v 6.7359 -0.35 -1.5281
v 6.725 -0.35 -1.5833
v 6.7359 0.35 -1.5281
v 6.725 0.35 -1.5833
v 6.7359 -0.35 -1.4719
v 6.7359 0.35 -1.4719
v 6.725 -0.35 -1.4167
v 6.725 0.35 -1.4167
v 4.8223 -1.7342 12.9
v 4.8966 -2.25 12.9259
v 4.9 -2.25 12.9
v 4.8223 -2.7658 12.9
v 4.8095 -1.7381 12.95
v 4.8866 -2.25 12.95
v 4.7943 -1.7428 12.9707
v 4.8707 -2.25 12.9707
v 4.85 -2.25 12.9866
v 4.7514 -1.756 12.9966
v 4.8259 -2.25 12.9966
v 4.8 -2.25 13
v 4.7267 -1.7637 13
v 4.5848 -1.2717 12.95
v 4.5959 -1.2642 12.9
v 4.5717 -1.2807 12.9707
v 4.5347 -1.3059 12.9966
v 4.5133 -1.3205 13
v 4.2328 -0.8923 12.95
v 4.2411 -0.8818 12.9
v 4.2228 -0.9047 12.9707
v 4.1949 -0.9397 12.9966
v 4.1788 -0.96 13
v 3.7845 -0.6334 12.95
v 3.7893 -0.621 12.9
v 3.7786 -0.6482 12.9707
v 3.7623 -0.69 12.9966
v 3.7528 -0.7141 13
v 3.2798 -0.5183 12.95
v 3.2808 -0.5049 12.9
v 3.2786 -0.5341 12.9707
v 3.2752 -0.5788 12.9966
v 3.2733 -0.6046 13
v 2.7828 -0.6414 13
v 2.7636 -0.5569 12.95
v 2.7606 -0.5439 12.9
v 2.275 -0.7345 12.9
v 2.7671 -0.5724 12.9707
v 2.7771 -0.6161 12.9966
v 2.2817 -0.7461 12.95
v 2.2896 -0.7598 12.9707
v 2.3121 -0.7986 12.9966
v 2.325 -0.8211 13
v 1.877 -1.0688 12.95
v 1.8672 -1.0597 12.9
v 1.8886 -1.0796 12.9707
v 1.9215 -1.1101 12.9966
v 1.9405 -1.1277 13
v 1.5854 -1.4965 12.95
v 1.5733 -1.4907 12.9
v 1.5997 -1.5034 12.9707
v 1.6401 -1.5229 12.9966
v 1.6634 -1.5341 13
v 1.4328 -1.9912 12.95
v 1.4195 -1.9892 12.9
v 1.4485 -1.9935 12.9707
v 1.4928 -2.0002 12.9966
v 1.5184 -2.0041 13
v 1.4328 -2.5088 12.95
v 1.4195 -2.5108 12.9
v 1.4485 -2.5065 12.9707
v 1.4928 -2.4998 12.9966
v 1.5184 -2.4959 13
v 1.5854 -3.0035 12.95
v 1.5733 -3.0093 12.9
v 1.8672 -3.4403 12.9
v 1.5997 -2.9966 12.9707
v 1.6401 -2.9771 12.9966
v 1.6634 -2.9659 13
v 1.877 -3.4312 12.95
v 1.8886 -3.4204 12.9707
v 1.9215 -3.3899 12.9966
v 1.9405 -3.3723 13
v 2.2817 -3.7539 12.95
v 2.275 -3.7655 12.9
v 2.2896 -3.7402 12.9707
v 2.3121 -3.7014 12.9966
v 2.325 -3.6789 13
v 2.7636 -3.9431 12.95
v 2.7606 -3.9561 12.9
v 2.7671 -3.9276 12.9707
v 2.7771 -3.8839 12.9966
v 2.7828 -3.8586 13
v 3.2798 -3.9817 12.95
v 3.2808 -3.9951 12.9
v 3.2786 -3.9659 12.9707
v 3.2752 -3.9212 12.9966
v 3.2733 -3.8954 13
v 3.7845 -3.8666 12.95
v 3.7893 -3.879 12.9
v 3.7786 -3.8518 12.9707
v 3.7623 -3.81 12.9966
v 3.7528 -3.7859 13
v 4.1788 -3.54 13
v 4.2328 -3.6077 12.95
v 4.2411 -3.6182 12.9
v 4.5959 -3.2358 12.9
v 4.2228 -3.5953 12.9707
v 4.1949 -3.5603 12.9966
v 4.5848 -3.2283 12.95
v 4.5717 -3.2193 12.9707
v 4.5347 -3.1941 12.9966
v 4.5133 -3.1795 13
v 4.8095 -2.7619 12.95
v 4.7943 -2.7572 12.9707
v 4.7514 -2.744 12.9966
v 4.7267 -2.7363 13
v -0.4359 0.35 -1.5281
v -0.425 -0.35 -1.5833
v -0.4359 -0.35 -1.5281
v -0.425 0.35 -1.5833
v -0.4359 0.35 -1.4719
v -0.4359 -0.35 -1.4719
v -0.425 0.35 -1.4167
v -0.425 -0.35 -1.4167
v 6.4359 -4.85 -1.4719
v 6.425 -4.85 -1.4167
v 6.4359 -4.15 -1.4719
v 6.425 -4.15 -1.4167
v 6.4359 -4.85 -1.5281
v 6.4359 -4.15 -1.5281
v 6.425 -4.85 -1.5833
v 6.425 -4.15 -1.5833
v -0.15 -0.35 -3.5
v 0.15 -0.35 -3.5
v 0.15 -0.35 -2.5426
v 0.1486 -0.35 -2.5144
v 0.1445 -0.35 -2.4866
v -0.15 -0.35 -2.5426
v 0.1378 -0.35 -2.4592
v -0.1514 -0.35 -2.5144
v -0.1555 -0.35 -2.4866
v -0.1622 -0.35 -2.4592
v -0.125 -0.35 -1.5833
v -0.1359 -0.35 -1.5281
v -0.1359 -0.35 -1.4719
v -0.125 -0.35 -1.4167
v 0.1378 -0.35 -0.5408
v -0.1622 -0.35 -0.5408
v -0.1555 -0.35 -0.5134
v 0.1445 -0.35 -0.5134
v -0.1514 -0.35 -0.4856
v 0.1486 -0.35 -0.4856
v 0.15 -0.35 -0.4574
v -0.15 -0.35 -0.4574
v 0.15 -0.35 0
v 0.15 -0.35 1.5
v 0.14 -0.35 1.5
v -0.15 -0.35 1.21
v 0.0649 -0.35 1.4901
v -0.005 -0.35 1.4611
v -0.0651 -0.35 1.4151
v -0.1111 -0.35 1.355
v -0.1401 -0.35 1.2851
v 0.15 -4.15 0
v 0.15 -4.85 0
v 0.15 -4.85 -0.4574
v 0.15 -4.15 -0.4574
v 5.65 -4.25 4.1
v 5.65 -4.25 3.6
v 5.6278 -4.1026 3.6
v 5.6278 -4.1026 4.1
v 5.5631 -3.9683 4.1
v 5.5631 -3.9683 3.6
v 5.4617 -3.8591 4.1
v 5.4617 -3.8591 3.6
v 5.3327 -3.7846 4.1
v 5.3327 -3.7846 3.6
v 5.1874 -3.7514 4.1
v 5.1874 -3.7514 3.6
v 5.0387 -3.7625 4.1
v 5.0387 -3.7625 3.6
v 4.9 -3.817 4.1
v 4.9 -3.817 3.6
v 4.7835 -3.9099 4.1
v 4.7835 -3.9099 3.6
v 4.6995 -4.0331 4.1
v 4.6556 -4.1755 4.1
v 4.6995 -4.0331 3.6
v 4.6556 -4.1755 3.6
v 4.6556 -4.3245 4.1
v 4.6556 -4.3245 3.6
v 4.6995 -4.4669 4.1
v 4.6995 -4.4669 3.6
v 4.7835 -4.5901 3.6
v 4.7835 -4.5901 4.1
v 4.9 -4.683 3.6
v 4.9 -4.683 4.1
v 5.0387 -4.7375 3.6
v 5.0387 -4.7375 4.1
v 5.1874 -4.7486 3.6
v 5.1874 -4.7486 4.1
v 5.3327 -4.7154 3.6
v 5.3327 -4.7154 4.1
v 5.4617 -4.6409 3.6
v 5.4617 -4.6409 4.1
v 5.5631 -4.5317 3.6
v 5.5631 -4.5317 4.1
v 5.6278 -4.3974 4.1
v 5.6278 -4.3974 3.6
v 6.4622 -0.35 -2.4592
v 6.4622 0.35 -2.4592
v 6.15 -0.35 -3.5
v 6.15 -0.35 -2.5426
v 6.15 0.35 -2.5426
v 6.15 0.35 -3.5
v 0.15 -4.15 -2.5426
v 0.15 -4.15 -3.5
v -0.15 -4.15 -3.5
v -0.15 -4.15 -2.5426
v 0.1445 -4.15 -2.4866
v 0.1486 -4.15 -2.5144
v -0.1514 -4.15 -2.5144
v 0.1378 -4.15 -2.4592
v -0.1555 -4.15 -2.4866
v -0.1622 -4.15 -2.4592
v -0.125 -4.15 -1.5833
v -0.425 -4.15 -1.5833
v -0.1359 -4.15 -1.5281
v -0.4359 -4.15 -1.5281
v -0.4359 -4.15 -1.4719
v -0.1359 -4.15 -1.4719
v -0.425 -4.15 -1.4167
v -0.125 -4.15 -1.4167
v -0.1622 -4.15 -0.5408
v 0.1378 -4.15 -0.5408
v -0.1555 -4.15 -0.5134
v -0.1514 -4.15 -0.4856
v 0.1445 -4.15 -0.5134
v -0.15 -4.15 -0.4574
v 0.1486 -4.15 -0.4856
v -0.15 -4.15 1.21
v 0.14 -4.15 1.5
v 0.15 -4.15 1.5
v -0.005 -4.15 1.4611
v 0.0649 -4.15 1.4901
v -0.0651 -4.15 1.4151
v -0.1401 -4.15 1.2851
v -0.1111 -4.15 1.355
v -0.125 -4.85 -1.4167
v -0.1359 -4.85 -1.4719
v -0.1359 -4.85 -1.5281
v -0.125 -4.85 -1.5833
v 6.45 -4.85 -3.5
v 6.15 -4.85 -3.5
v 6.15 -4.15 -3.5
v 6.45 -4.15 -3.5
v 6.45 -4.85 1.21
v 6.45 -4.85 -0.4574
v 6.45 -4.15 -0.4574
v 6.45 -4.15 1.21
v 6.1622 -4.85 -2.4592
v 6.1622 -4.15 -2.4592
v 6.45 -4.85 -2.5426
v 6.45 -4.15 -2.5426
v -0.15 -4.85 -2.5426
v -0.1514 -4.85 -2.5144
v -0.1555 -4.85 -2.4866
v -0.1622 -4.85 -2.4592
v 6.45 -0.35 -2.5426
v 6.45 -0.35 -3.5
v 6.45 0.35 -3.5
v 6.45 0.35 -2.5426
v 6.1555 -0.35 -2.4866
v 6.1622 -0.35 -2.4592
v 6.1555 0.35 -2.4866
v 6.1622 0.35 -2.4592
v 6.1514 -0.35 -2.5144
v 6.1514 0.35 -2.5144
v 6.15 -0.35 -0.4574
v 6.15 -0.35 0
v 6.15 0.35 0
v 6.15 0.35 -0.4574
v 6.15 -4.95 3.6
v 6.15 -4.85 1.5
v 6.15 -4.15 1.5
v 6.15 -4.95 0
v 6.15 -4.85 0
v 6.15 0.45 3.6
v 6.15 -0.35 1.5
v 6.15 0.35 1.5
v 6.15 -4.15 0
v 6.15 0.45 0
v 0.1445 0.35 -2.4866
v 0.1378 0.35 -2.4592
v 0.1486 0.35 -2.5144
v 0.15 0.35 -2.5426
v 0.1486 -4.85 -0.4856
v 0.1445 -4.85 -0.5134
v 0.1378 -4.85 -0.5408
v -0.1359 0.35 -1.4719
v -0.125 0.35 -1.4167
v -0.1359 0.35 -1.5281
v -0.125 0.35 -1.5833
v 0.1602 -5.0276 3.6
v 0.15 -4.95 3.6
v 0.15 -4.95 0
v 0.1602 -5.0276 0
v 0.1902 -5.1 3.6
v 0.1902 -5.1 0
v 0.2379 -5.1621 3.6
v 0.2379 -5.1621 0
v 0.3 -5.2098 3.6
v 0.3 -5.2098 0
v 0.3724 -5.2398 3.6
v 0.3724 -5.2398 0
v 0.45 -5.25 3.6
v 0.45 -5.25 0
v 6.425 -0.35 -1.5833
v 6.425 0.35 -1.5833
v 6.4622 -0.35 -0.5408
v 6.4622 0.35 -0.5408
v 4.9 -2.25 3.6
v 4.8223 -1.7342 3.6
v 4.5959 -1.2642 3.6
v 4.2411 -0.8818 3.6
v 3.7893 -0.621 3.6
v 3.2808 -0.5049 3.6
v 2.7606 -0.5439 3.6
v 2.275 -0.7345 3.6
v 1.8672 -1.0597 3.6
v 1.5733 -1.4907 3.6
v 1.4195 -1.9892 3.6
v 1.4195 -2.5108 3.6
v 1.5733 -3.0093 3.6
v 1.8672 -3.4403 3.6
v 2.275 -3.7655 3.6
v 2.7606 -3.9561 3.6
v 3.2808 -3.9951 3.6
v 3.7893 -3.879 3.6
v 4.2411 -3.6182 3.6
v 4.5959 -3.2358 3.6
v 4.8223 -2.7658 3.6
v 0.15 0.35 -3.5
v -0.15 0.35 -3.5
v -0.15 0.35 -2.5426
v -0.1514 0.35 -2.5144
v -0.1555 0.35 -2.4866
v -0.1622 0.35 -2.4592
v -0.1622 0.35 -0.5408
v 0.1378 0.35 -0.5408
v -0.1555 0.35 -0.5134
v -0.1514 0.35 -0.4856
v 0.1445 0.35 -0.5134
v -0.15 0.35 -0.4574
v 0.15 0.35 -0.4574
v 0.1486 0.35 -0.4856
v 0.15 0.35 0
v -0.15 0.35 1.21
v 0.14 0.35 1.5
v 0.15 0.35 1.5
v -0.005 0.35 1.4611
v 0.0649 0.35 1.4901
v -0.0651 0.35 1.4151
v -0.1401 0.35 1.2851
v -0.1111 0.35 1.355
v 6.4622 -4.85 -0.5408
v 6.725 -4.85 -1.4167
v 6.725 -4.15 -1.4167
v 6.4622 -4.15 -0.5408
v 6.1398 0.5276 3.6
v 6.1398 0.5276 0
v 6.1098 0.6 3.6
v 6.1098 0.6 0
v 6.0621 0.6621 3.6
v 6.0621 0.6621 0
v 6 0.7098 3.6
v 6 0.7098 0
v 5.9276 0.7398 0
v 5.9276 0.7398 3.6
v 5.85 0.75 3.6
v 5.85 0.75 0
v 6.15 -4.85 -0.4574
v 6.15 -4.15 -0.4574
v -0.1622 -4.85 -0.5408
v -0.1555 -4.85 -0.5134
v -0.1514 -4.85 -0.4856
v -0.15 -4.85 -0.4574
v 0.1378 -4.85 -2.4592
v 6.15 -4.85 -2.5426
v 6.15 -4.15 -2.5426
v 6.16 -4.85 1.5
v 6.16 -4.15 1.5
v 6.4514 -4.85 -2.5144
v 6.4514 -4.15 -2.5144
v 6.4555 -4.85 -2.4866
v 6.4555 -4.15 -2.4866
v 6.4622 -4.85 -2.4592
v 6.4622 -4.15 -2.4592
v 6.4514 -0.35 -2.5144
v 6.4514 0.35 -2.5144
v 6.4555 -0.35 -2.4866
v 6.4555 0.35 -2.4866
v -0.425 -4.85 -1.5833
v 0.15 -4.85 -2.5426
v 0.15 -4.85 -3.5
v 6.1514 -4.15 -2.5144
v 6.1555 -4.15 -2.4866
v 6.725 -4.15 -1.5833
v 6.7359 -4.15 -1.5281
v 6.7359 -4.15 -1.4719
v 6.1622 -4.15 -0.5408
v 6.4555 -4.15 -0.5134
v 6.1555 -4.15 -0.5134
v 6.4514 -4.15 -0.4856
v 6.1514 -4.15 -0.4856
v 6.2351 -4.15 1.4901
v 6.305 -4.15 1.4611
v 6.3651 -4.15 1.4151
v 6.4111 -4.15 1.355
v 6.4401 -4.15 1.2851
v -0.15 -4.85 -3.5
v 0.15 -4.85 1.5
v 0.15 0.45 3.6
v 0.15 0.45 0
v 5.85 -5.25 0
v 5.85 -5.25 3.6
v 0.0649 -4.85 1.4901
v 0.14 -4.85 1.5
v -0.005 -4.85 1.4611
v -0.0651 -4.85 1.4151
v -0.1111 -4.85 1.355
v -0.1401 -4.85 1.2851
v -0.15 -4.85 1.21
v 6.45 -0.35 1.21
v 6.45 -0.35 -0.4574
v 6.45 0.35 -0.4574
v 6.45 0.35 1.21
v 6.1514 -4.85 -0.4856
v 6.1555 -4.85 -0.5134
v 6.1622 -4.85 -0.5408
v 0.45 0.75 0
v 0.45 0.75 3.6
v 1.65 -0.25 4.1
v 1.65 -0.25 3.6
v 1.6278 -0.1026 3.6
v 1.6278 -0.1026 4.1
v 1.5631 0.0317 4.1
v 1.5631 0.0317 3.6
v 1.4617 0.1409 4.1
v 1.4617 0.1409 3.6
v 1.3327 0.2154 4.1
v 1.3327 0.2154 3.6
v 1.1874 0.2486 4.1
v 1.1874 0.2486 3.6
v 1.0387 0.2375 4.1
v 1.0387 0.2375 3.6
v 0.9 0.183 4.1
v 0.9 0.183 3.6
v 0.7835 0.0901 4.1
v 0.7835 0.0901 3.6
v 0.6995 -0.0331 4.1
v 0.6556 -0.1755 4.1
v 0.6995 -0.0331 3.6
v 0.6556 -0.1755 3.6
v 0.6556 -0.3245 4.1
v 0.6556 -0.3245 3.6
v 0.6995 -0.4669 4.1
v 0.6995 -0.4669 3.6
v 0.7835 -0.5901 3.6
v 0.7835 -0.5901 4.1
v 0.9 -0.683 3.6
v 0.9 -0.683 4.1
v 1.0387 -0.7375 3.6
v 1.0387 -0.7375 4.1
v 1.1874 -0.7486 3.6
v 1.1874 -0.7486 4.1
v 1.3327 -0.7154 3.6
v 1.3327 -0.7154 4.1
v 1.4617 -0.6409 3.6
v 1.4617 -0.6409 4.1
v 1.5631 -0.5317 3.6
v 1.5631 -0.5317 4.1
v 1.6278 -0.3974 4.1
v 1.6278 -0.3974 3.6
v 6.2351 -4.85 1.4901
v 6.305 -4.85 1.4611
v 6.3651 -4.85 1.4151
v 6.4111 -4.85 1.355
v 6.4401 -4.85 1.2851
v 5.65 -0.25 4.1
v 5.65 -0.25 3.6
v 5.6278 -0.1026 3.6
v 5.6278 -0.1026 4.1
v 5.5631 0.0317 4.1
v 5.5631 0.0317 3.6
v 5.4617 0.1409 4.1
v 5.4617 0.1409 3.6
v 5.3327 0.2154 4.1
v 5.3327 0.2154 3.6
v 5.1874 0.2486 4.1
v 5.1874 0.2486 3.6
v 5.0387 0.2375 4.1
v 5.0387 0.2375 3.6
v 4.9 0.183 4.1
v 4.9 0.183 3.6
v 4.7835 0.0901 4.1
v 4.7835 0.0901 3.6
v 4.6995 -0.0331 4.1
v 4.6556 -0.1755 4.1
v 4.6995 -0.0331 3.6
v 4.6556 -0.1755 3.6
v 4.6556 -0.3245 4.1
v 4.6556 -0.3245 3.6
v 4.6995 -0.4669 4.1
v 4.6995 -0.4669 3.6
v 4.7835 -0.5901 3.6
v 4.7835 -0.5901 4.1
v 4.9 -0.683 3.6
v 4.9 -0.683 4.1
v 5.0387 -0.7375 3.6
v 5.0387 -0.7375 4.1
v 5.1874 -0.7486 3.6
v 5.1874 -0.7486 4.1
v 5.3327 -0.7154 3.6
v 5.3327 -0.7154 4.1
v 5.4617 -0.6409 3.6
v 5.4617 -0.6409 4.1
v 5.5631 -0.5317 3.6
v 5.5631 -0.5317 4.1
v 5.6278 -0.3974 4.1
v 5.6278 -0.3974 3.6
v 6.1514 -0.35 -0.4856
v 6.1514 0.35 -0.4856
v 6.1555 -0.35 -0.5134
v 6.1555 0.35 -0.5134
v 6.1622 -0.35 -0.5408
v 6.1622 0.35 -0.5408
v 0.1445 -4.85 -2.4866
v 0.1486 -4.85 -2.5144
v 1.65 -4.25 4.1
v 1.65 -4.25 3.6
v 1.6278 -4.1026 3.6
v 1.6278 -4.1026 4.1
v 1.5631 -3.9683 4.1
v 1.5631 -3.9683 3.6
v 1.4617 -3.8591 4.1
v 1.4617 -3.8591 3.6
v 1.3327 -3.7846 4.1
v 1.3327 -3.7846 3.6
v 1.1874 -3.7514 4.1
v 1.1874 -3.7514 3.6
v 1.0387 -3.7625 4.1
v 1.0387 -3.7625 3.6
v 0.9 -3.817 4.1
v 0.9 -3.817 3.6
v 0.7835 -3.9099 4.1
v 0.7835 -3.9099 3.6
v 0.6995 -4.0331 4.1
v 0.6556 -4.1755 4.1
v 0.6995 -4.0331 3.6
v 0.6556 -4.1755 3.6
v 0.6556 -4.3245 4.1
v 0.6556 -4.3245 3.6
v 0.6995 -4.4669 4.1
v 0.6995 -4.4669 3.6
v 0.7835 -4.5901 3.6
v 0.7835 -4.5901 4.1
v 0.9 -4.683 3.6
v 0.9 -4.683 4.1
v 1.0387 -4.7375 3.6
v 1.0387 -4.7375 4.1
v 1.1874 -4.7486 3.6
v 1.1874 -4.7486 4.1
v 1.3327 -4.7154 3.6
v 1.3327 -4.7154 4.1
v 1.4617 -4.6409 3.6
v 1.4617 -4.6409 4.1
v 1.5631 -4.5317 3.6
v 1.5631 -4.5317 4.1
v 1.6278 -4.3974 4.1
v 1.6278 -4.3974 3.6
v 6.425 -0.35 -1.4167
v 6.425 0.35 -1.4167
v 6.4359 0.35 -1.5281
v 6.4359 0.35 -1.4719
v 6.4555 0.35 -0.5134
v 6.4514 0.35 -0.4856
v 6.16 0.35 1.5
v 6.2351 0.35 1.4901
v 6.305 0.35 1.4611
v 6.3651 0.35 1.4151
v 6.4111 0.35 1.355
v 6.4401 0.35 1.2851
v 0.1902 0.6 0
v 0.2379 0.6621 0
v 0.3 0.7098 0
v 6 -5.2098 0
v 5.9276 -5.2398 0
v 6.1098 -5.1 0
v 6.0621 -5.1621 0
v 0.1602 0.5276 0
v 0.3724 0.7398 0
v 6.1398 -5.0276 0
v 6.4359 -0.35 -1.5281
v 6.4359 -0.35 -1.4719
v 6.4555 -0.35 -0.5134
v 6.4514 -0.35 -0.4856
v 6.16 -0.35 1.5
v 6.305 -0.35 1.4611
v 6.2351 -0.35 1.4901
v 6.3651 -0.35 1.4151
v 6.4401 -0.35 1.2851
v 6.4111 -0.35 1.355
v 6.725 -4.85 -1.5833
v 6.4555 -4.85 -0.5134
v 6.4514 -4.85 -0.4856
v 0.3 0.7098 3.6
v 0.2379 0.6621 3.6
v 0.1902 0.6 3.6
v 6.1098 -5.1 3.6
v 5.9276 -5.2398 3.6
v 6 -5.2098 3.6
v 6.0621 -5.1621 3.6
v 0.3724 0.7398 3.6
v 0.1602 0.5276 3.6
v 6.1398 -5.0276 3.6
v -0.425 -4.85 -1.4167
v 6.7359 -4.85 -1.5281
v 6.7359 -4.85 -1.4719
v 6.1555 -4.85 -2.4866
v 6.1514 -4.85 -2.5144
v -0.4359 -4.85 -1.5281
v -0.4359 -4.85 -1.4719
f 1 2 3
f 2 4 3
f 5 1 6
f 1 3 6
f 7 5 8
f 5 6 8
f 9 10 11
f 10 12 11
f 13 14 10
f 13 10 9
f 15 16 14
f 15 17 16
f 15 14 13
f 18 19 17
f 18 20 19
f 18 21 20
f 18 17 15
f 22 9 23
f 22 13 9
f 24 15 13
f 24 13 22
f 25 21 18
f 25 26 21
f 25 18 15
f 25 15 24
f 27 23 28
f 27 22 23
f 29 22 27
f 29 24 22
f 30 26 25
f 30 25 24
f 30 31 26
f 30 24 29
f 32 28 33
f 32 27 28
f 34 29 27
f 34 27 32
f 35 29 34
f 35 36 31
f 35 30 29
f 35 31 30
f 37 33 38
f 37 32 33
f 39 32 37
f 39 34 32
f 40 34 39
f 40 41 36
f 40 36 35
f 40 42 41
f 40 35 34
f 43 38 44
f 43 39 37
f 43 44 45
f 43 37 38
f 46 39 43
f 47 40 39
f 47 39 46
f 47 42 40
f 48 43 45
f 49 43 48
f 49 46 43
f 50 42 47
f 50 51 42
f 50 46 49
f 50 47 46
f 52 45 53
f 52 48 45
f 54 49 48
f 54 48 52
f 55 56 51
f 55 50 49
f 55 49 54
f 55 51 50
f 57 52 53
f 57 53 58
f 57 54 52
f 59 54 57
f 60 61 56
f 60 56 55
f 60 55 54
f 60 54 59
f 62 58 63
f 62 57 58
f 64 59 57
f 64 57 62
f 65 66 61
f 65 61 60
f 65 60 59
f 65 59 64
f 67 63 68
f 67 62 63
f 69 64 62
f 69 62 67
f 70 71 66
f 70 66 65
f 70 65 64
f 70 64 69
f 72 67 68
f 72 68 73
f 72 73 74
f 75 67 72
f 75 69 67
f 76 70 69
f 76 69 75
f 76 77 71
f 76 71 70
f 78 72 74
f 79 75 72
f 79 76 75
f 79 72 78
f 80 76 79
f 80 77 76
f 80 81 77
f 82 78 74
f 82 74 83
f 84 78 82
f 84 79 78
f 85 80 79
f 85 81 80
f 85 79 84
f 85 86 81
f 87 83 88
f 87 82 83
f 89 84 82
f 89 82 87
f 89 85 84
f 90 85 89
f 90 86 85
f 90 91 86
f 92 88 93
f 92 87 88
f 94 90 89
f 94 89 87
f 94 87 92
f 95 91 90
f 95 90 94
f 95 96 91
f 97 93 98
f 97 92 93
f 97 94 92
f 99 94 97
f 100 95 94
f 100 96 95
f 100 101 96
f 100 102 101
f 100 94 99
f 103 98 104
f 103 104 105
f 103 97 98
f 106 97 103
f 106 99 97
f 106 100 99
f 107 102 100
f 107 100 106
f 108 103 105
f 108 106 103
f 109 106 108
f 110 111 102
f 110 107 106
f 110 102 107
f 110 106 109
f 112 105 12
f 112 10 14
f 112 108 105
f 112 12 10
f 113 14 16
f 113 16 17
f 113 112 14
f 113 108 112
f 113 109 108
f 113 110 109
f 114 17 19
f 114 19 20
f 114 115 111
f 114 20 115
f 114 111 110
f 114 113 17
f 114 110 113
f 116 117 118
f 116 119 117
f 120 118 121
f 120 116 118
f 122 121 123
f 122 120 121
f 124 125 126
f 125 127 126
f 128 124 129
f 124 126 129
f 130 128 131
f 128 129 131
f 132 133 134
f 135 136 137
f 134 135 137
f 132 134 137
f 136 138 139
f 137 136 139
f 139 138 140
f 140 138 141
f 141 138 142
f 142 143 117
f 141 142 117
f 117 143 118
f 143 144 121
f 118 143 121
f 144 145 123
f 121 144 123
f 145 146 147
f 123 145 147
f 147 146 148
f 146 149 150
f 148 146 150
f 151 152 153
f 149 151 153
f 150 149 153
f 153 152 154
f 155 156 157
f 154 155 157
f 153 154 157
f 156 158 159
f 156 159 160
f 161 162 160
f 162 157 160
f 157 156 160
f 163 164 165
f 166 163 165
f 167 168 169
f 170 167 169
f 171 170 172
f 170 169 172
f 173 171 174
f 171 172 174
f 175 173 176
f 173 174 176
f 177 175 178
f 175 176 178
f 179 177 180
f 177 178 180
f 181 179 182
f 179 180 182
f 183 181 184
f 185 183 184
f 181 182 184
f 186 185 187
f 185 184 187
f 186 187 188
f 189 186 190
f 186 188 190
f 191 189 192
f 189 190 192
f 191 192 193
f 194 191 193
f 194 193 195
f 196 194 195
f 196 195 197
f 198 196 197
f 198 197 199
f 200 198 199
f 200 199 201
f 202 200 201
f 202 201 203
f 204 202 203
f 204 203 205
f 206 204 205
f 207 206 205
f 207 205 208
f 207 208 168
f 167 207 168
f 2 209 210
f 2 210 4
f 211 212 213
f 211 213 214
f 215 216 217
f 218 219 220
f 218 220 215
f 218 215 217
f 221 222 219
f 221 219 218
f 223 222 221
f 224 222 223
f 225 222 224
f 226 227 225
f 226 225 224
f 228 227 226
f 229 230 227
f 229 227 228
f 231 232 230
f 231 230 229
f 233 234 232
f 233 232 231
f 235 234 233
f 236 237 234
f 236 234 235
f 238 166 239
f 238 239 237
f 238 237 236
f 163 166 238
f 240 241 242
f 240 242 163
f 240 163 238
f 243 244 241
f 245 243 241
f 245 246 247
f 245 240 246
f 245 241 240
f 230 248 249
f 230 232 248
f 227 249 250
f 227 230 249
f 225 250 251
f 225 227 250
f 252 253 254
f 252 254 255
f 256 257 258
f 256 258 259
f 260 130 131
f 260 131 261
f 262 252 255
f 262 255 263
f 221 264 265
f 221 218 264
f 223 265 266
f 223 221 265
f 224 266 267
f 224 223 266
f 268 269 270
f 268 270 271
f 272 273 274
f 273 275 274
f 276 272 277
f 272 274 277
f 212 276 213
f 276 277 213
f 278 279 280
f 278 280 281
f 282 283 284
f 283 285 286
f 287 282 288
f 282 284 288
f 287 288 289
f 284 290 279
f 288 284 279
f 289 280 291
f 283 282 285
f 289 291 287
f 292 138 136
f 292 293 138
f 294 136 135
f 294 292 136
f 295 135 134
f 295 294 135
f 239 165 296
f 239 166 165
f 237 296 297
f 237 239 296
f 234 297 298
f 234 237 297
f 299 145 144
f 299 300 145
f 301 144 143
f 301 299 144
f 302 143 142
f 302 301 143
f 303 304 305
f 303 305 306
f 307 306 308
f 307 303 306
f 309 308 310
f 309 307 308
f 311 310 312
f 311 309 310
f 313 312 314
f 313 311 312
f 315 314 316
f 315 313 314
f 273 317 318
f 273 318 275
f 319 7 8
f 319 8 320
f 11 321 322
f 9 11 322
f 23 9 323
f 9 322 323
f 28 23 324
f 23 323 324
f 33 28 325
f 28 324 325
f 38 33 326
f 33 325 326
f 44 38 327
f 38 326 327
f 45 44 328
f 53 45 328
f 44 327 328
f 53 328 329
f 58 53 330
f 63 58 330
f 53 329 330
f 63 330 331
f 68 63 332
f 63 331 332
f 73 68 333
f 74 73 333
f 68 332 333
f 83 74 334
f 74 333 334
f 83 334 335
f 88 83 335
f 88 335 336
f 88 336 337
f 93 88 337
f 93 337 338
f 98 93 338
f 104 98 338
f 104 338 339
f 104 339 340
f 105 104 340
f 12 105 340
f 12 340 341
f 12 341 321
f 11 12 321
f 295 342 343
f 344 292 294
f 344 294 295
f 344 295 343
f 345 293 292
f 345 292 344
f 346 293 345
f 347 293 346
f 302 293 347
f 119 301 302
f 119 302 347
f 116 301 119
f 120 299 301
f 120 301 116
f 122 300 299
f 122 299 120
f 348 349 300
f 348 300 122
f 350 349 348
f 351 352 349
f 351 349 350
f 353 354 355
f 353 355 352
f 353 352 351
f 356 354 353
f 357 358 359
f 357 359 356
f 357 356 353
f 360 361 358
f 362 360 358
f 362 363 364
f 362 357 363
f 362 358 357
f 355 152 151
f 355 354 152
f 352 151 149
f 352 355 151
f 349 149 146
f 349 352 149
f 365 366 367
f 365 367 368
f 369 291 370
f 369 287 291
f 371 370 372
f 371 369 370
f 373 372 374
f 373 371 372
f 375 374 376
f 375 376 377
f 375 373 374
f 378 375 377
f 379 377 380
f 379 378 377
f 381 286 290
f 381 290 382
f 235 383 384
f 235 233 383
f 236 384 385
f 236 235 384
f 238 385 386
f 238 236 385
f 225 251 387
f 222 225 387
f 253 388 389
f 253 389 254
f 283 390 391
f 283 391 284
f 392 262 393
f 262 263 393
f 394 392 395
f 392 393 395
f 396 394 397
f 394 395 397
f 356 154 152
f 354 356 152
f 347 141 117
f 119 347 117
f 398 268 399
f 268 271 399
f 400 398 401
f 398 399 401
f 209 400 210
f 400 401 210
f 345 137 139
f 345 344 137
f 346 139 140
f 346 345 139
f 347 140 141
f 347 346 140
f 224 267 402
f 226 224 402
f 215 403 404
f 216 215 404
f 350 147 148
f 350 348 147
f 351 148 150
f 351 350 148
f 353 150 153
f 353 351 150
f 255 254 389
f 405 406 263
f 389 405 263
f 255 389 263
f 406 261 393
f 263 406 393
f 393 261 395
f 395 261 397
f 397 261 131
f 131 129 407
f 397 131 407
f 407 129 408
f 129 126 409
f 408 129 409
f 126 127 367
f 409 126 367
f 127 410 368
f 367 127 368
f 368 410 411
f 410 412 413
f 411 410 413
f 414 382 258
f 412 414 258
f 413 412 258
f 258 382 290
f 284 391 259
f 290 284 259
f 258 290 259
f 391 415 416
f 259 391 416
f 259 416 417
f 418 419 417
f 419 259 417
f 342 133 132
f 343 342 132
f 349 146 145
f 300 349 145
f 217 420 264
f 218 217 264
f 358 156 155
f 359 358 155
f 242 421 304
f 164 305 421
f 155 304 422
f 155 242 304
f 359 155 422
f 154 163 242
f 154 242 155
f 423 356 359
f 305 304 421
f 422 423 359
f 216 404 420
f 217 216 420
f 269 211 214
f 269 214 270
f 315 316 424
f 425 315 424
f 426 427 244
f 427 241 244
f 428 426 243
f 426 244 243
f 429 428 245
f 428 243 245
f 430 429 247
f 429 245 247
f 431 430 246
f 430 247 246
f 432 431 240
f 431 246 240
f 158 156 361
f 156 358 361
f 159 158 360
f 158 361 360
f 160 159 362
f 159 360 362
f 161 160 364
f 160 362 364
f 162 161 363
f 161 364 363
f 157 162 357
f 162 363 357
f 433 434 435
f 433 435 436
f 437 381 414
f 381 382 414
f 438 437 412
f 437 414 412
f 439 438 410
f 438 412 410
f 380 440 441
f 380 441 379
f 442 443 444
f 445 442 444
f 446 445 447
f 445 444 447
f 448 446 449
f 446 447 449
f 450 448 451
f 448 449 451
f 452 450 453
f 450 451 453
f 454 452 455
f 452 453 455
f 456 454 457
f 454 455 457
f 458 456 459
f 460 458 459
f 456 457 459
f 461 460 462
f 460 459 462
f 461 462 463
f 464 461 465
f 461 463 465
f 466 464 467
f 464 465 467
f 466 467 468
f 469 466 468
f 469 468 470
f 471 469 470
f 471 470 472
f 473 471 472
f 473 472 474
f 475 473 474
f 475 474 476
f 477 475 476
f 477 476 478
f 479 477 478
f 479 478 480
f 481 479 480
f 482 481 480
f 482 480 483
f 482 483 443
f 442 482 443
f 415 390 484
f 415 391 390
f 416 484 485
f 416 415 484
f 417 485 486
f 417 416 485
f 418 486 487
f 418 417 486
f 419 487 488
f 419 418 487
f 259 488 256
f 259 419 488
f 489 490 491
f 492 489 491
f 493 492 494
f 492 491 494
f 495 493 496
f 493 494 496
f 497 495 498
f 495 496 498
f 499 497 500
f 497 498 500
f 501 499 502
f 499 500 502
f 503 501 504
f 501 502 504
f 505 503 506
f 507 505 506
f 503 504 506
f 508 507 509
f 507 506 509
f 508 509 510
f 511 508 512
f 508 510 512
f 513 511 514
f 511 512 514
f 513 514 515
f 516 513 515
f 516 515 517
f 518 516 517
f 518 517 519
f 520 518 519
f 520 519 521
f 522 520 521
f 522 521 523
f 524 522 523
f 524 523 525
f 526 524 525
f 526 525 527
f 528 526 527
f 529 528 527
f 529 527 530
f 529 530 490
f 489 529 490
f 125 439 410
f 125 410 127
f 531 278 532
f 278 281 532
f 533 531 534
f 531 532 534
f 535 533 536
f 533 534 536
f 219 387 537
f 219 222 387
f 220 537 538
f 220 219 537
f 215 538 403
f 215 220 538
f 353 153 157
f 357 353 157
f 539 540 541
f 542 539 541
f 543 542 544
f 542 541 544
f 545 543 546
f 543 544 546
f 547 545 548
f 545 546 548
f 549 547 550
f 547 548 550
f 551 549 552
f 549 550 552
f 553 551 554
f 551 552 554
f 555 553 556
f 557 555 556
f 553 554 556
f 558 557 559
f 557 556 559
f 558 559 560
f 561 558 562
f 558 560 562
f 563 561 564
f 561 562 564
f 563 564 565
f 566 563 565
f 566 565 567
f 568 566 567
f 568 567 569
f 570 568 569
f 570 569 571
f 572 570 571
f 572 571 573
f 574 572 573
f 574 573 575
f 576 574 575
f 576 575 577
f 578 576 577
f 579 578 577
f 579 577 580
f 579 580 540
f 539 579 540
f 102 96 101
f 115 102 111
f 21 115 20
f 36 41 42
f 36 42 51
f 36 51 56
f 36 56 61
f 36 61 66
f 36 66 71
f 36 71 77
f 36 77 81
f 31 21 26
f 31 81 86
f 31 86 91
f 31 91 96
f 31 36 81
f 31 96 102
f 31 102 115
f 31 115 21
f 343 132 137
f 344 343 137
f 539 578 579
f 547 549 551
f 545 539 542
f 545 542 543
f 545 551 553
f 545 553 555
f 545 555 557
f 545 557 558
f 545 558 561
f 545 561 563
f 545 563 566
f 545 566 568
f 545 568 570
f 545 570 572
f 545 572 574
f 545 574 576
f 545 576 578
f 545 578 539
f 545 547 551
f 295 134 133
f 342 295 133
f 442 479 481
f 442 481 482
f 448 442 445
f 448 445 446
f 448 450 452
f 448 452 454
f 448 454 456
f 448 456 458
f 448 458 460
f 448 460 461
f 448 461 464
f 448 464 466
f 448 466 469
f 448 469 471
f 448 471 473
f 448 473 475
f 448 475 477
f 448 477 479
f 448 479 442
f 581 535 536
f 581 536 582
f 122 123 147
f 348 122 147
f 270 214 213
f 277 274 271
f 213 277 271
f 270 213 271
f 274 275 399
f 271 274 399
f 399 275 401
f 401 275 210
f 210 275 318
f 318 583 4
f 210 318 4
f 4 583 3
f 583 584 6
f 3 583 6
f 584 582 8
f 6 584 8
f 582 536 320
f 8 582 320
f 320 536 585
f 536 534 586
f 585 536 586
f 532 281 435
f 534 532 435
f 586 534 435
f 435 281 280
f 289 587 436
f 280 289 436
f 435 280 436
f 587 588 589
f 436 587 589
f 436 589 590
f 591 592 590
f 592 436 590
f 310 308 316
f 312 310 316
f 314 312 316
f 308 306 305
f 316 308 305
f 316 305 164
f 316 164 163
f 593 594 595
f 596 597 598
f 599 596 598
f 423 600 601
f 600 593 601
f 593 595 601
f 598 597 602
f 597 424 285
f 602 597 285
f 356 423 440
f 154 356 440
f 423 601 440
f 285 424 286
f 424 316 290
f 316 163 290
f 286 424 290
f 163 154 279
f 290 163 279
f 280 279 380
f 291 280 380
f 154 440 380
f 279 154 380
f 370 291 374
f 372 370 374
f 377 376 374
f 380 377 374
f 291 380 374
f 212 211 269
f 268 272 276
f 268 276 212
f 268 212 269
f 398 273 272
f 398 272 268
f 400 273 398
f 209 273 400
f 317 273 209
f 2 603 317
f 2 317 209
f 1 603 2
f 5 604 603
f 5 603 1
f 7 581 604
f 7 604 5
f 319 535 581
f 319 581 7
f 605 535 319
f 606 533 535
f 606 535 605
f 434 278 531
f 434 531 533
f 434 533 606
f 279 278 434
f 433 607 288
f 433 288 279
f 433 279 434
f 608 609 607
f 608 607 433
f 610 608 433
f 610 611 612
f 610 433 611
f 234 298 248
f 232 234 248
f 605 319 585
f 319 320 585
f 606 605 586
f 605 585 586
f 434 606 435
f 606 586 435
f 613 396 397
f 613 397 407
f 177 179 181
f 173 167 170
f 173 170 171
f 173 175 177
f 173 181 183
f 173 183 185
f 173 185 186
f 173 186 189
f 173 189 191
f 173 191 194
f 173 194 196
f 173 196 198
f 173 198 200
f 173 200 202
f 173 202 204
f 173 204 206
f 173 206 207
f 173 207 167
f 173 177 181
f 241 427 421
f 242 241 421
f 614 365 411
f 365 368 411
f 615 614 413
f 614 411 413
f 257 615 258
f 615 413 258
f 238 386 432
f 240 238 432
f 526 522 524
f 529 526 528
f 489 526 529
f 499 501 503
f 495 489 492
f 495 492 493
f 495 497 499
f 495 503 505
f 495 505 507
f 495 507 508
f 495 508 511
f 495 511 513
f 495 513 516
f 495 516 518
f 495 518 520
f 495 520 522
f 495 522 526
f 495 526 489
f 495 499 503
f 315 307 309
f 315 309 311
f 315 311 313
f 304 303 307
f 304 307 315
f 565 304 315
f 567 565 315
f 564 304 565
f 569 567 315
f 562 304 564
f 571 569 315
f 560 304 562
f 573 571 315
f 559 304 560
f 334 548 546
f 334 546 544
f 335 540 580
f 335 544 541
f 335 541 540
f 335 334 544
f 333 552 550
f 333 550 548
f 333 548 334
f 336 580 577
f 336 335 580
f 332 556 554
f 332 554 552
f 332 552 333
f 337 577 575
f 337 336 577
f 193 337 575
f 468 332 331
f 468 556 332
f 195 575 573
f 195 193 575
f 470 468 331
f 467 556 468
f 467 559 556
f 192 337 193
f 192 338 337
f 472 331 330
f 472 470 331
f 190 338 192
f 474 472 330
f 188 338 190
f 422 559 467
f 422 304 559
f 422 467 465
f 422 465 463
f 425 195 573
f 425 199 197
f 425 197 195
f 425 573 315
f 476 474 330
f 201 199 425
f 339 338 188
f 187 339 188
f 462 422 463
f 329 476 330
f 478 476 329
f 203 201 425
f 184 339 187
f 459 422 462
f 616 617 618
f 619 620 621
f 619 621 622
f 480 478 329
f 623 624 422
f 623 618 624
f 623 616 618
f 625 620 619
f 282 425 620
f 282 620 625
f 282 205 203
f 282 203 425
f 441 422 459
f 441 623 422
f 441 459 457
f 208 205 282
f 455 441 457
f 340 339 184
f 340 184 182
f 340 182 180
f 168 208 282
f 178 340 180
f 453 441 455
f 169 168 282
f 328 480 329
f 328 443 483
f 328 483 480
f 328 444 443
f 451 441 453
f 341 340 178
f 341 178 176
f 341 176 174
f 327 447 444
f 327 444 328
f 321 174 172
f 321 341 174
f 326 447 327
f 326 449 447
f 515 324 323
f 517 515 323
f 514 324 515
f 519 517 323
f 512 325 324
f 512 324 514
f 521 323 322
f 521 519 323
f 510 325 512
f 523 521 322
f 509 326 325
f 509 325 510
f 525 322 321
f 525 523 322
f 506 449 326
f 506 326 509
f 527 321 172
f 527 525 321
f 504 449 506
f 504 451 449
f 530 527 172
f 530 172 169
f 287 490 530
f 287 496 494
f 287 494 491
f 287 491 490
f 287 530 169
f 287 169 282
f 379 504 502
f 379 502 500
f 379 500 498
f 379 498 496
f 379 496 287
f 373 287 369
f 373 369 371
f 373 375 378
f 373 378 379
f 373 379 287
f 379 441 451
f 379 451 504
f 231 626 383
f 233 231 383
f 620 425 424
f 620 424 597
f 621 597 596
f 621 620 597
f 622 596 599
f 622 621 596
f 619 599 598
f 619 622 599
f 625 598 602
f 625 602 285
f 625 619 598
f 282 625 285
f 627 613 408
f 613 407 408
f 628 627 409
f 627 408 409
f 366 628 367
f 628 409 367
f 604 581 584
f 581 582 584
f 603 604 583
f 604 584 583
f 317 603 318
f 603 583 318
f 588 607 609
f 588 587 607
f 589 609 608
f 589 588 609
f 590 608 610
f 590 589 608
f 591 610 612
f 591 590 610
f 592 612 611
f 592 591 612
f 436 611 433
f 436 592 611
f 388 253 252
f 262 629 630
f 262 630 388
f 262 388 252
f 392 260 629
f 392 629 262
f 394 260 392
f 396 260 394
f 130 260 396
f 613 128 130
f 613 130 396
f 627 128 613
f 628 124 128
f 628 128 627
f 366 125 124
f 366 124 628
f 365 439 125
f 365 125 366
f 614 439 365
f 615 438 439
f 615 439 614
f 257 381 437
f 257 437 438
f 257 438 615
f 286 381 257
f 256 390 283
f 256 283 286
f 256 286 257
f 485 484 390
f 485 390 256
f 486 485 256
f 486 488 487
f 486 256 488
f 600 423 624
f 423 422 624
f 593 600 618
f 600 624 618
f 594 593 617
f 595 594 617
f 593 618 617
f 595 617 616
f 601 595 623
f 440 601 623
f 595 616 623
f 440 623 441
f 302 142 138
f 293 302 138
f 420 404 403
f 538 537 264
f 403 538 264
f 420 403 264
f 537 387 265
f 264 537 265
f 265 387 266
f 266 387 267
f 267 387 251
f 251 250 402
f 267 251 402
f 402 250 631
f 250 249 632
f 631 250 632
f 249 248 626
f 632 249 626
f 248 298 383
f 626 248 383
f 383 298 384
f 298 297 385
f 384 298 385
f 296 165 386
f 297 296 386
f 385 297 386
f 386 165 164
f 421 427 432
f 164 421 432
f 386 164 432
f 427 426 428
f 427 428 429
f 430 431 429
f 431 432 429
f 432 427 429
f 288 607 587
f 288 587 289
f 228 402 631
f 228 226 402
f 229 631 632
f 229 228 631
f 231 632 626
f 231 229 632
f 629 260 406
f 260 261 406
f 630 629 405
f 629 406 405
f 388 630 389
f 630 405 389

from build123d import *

# Parameters (mm, degrees)
SKETCH001_W  = 6
SKETCH001_H  = 6
PAD001_DEPTH = 0.1
FILLET001_R  = 0.3
PAD008_DEPTH = 0.7
FILLET003_R  = 0.29
PAD009_DEPTH = 0.7
FILLET004_R  = 0.29
PAD010_DEPTH = 0.7
FILLET005_R  = 0.29
SKETCH_W     = 6
SKETCH_H     = 6
PAD_DEPTH    = 3.5
FILLET_R     = 0.3
SKETCH004_R  = 0.5
PAD003_DEPTH = 0.6
SKETCH003_R  = 0.5
PAD004_DEPTH = 0.6
SKETCH005_R  = 0.5
PAD002_DEPTH = 0.6
SKETCH002_R  = 0.5
PAD005_DEPTH = 0.6
SKETCH006_R  = 1.75
PAD006_DEPTH = 9.5
FILLET006_R  = 0.1
PAD007_DEPTH = 0.7
FILLET002_R  = 0.29


with BuildPart() as fillet001:
    # Sketch001 → Pad001 (new body)
    with BuildSketch(Plane.XY.offset(3.5)):
        with Locations((3.15, -2.25)):
            Rectangle(SKETCH001_W, SKETCH001_H)
    extrude(amount=PAD001_DEPTH)

    # Fillet001
    fillet001_edges = [fillet001.edges().sort_by_distance(p)[0] for p in [
        (6.15, -5.25, 3.55),
        (0.15, -5.25, 3.55),
        (6.15, 0.75, 3.55),
        (0.15, 0.75, 3.55),
    ]]
    fillet(fillet001_edges, radius=FILLET001_R)


with BuildPart() as fillet003:
    # Sketch008 → Pad008 (new body)
    with BuildSketch(Plane.XZ.offset(0.35)):
        Polygon((-0.15, 1.5), (0.15, 1.5), (0.15, -0.5), (-0.15, -1.5), (0.15, -2.5), (0.15, -3.5), (-0.15, -3.5), (-0.15, -2.5), (-0.45, -1.5), (-0.15, -0.5), align=None)
    extrude(amount=-PAD008_DEPTH)

    # Fillet003
    fillet003_edges = [fillet003.edges().sort_by_distance(p)[0] for p in [
        (-0.15, 0, -2.5),
        (-0.15, 0, -0.5),
        (-0.45, 0, -1.5),
        (-0.15, 0, 1.5),
        (0.15, 0, -0.5),
        (-0.15, 0, -1.5),
        (0.15, 0, -2.5),
    ]]
    fillet(fillet003_edges, radius=FILLET003_R)


with BuildPart() as fillet004:
    # Sketch009 → Pad009 (new body)
    with BuildSketch(Plane.XZ.offset(4.85)):
        Polygon((6.45, 1.5), (6.15, 1.5), (6.15, -0.5), (6.45, -1.5), (6.15, -2.5), (6.15, -3.5), (6.45, -3.5), (6.45, -2.5), (6.75, -1.5), (6.45, -0.5), align=None)
    extrude(amount=-PAD009_DEPTH)

    # Fillet004
    fillet004_edges = [fillet004.edges().sort_by_distance(p)[0] for p in [
        (6.45, -4.5, -2.5),
        (6.45, -4.5, -0.5),
        (6.75, -4.5, -1.5),
        (6.45, -4.5, 1.5),
        (6.15, -4.5, -0.5),
        (6.45, -4.5, -1.5),
        (6.15, -4.5, -2.5),
    ]]
    fillet(fillet004_edges, radius=FILLET004_R)


with BuildPart() as fillet005:
    # Sketch010 → Pad010 (new body)
    with BuildSketch(Plane.XZ.offset(0.35)):
        Polygon((6.45, 1.5), (6.15, 1.5), (6.15, -0.5), (6.45, -1.5), (6.15, -2.5), (6.15, -3.5), (6.45, -3.5), (6.45, -2.5), (6.75, -1.5), (6.45, -0.5), align=None)
    extrude(amount=-PAD010_DEPTH)

    # Fillet005
    fillet005_edges = [fillet005.edges().sort_by_distance(p)[0] for p in [
        (6.45, 0, -2.5),
        (6.45, 0, -0.5),
        (6.75, 0, -1.5),
        (6.45, 0, 1.5),
        (6.15, 0, -0.5),
        (6.45, 0, -1.5),
        (6.15, 0, -2.5),
    ]]
    fillet(fillet005_edges, radius=FILLET005_R)


with BuildPart() as fillet_body:
    # Sketch → Pad (new body)
    with BuildSketch(Plane.XY):
        with Locations((3.15, -2.25)):
            Rectangle(SKETCH_W, SKETCH_H)
    extrude(amount=PAD_DEPTH)

    # Fillet
    fillet_edges = [fillet_body.edges().sort_by_distance(p)[0] for p in [
        (6.15, 0.75, 1.75),
        (6.15, -5.25, 1.75),
        (0.15, -5.25, 1.75),
        (0.15, 0.75, 1.75),
    ]]
    fillet(fillet_edges, radius=FILLET_R)


with BuildPart() as pad003:
    # Pad003 base: copy of Fillet body
    add(fillet_body.part)

    # Sketch004 → Pad003 (new body)
    with BuildSketch(Plane.XY.offset(3.5)):
        with Locations((5.15, -0.25)):
            Circle(SKETCH004_R)
    extrude(amount=PAD003_DEPTH)


with BuildPart() as pad004:
    # Pad004 base: copy of Fillet body
    add(fillet_body.part)

    # Sketch003 → Pad004 (new body)
    with BuildSketch(Plane.XY.offset(3.5)):
        with Locations((5.15, -4.25)):
            Circle(SKETCH003_R)
    extrude(amount=PAD004_DEPTH)


with BuildPart() as pad002:
    # Pad002 base: copy of Fillet body
    add(fillet_body.part)

    # Sketch005 → Pad002 (new body)
    with BuildSketch(Plane.XY.offset(3.5)):
        with Locations((1.15, -0.25)):
            Circle(SKETCH005_R)
    extrude(amount=PAD002_DEPTH)


with BuildPart() as pad005:
    # Pad005 base: copy of Fillet body
    add(fillet_body.part)

    # Sketch002 → Pad005 (new body)
    with BuildSketch(Plane.XY.offset(3.5)):
        with Locations((1.15, -4.25)):
            Circle(SKETCH002_R)
    extrude(amount=PAD005_DEPTH)


with BuildPart() as fillet006:
    # Pad006 base: copy of Fillet body
    add(fillet_body.part)

    # Sketch006 → Pad006 (new body)
    with BuildSketch(Plane.XY.offset(3.5)):
        with Locations((3.15, -2.25)):
            Circle(SKETCH006_R)
    extrude(amount=PAD006_DEPTH)

    # Fillet006
    fillet006_edges = [fillet006.edges().sort_by_distance(p)[0] for p in [
        (1.4, -2.25, 13),
    ]]
    fillet(fillet006_edges, radius=FILLET006_R)


with BuildPart() as sw_push_6mm_h13mm:
    # Sketch007 → Pad007 (new body)
    with BuildSketch(Plane.XZ.offset(4.85)):
        Polygon((-0.15, 1.5), (0.15, 1.5), (0.15, -0.5), (-0.15, -1.5), (0.15, -2.5), (0.15, -3.5), (-0.15, -3.5), (-0.15, -2.5), (-0.45, -1.5), (-0.15, -0.5), align=None)
    extrude(amount=-PAD007_DEPTH)

    # Fillet002
    fillet002_edges = [sw_push_6mm_h13mm.edges().sort_by_distance(p)[0] for p in [
        (-0.15, -4.5, -2.5),
        (-0.15, -4.5, -0.5),
        (-0.45, -4.5, -1.5),
        (-0.15, -4.5, 1.5),
        (0.15, -4.5, -0.5),
        (-0.15, -4.5, -1.5),
        (0.15, -4.5, -2.5),
    ]]
    fillet(fillet002_edges, radius=FILLET002_R)

    # Fillet002_mp_cp: union Fillet001, Fillet003, Fillet004, Fillet005, Pad003, Pad004, Pad002, Pad005, Fillet006
    add(fillet001.part)
    add(fillet003.part)
    add(fillet004.part)
    add(fillet005.part)
    add(pad003.part)
    add(pad004.part)
    add(pad002.part)
    add(pad005.part)
    add(fillet006.part)


solid = sw_push_6mm_h13mm.part
